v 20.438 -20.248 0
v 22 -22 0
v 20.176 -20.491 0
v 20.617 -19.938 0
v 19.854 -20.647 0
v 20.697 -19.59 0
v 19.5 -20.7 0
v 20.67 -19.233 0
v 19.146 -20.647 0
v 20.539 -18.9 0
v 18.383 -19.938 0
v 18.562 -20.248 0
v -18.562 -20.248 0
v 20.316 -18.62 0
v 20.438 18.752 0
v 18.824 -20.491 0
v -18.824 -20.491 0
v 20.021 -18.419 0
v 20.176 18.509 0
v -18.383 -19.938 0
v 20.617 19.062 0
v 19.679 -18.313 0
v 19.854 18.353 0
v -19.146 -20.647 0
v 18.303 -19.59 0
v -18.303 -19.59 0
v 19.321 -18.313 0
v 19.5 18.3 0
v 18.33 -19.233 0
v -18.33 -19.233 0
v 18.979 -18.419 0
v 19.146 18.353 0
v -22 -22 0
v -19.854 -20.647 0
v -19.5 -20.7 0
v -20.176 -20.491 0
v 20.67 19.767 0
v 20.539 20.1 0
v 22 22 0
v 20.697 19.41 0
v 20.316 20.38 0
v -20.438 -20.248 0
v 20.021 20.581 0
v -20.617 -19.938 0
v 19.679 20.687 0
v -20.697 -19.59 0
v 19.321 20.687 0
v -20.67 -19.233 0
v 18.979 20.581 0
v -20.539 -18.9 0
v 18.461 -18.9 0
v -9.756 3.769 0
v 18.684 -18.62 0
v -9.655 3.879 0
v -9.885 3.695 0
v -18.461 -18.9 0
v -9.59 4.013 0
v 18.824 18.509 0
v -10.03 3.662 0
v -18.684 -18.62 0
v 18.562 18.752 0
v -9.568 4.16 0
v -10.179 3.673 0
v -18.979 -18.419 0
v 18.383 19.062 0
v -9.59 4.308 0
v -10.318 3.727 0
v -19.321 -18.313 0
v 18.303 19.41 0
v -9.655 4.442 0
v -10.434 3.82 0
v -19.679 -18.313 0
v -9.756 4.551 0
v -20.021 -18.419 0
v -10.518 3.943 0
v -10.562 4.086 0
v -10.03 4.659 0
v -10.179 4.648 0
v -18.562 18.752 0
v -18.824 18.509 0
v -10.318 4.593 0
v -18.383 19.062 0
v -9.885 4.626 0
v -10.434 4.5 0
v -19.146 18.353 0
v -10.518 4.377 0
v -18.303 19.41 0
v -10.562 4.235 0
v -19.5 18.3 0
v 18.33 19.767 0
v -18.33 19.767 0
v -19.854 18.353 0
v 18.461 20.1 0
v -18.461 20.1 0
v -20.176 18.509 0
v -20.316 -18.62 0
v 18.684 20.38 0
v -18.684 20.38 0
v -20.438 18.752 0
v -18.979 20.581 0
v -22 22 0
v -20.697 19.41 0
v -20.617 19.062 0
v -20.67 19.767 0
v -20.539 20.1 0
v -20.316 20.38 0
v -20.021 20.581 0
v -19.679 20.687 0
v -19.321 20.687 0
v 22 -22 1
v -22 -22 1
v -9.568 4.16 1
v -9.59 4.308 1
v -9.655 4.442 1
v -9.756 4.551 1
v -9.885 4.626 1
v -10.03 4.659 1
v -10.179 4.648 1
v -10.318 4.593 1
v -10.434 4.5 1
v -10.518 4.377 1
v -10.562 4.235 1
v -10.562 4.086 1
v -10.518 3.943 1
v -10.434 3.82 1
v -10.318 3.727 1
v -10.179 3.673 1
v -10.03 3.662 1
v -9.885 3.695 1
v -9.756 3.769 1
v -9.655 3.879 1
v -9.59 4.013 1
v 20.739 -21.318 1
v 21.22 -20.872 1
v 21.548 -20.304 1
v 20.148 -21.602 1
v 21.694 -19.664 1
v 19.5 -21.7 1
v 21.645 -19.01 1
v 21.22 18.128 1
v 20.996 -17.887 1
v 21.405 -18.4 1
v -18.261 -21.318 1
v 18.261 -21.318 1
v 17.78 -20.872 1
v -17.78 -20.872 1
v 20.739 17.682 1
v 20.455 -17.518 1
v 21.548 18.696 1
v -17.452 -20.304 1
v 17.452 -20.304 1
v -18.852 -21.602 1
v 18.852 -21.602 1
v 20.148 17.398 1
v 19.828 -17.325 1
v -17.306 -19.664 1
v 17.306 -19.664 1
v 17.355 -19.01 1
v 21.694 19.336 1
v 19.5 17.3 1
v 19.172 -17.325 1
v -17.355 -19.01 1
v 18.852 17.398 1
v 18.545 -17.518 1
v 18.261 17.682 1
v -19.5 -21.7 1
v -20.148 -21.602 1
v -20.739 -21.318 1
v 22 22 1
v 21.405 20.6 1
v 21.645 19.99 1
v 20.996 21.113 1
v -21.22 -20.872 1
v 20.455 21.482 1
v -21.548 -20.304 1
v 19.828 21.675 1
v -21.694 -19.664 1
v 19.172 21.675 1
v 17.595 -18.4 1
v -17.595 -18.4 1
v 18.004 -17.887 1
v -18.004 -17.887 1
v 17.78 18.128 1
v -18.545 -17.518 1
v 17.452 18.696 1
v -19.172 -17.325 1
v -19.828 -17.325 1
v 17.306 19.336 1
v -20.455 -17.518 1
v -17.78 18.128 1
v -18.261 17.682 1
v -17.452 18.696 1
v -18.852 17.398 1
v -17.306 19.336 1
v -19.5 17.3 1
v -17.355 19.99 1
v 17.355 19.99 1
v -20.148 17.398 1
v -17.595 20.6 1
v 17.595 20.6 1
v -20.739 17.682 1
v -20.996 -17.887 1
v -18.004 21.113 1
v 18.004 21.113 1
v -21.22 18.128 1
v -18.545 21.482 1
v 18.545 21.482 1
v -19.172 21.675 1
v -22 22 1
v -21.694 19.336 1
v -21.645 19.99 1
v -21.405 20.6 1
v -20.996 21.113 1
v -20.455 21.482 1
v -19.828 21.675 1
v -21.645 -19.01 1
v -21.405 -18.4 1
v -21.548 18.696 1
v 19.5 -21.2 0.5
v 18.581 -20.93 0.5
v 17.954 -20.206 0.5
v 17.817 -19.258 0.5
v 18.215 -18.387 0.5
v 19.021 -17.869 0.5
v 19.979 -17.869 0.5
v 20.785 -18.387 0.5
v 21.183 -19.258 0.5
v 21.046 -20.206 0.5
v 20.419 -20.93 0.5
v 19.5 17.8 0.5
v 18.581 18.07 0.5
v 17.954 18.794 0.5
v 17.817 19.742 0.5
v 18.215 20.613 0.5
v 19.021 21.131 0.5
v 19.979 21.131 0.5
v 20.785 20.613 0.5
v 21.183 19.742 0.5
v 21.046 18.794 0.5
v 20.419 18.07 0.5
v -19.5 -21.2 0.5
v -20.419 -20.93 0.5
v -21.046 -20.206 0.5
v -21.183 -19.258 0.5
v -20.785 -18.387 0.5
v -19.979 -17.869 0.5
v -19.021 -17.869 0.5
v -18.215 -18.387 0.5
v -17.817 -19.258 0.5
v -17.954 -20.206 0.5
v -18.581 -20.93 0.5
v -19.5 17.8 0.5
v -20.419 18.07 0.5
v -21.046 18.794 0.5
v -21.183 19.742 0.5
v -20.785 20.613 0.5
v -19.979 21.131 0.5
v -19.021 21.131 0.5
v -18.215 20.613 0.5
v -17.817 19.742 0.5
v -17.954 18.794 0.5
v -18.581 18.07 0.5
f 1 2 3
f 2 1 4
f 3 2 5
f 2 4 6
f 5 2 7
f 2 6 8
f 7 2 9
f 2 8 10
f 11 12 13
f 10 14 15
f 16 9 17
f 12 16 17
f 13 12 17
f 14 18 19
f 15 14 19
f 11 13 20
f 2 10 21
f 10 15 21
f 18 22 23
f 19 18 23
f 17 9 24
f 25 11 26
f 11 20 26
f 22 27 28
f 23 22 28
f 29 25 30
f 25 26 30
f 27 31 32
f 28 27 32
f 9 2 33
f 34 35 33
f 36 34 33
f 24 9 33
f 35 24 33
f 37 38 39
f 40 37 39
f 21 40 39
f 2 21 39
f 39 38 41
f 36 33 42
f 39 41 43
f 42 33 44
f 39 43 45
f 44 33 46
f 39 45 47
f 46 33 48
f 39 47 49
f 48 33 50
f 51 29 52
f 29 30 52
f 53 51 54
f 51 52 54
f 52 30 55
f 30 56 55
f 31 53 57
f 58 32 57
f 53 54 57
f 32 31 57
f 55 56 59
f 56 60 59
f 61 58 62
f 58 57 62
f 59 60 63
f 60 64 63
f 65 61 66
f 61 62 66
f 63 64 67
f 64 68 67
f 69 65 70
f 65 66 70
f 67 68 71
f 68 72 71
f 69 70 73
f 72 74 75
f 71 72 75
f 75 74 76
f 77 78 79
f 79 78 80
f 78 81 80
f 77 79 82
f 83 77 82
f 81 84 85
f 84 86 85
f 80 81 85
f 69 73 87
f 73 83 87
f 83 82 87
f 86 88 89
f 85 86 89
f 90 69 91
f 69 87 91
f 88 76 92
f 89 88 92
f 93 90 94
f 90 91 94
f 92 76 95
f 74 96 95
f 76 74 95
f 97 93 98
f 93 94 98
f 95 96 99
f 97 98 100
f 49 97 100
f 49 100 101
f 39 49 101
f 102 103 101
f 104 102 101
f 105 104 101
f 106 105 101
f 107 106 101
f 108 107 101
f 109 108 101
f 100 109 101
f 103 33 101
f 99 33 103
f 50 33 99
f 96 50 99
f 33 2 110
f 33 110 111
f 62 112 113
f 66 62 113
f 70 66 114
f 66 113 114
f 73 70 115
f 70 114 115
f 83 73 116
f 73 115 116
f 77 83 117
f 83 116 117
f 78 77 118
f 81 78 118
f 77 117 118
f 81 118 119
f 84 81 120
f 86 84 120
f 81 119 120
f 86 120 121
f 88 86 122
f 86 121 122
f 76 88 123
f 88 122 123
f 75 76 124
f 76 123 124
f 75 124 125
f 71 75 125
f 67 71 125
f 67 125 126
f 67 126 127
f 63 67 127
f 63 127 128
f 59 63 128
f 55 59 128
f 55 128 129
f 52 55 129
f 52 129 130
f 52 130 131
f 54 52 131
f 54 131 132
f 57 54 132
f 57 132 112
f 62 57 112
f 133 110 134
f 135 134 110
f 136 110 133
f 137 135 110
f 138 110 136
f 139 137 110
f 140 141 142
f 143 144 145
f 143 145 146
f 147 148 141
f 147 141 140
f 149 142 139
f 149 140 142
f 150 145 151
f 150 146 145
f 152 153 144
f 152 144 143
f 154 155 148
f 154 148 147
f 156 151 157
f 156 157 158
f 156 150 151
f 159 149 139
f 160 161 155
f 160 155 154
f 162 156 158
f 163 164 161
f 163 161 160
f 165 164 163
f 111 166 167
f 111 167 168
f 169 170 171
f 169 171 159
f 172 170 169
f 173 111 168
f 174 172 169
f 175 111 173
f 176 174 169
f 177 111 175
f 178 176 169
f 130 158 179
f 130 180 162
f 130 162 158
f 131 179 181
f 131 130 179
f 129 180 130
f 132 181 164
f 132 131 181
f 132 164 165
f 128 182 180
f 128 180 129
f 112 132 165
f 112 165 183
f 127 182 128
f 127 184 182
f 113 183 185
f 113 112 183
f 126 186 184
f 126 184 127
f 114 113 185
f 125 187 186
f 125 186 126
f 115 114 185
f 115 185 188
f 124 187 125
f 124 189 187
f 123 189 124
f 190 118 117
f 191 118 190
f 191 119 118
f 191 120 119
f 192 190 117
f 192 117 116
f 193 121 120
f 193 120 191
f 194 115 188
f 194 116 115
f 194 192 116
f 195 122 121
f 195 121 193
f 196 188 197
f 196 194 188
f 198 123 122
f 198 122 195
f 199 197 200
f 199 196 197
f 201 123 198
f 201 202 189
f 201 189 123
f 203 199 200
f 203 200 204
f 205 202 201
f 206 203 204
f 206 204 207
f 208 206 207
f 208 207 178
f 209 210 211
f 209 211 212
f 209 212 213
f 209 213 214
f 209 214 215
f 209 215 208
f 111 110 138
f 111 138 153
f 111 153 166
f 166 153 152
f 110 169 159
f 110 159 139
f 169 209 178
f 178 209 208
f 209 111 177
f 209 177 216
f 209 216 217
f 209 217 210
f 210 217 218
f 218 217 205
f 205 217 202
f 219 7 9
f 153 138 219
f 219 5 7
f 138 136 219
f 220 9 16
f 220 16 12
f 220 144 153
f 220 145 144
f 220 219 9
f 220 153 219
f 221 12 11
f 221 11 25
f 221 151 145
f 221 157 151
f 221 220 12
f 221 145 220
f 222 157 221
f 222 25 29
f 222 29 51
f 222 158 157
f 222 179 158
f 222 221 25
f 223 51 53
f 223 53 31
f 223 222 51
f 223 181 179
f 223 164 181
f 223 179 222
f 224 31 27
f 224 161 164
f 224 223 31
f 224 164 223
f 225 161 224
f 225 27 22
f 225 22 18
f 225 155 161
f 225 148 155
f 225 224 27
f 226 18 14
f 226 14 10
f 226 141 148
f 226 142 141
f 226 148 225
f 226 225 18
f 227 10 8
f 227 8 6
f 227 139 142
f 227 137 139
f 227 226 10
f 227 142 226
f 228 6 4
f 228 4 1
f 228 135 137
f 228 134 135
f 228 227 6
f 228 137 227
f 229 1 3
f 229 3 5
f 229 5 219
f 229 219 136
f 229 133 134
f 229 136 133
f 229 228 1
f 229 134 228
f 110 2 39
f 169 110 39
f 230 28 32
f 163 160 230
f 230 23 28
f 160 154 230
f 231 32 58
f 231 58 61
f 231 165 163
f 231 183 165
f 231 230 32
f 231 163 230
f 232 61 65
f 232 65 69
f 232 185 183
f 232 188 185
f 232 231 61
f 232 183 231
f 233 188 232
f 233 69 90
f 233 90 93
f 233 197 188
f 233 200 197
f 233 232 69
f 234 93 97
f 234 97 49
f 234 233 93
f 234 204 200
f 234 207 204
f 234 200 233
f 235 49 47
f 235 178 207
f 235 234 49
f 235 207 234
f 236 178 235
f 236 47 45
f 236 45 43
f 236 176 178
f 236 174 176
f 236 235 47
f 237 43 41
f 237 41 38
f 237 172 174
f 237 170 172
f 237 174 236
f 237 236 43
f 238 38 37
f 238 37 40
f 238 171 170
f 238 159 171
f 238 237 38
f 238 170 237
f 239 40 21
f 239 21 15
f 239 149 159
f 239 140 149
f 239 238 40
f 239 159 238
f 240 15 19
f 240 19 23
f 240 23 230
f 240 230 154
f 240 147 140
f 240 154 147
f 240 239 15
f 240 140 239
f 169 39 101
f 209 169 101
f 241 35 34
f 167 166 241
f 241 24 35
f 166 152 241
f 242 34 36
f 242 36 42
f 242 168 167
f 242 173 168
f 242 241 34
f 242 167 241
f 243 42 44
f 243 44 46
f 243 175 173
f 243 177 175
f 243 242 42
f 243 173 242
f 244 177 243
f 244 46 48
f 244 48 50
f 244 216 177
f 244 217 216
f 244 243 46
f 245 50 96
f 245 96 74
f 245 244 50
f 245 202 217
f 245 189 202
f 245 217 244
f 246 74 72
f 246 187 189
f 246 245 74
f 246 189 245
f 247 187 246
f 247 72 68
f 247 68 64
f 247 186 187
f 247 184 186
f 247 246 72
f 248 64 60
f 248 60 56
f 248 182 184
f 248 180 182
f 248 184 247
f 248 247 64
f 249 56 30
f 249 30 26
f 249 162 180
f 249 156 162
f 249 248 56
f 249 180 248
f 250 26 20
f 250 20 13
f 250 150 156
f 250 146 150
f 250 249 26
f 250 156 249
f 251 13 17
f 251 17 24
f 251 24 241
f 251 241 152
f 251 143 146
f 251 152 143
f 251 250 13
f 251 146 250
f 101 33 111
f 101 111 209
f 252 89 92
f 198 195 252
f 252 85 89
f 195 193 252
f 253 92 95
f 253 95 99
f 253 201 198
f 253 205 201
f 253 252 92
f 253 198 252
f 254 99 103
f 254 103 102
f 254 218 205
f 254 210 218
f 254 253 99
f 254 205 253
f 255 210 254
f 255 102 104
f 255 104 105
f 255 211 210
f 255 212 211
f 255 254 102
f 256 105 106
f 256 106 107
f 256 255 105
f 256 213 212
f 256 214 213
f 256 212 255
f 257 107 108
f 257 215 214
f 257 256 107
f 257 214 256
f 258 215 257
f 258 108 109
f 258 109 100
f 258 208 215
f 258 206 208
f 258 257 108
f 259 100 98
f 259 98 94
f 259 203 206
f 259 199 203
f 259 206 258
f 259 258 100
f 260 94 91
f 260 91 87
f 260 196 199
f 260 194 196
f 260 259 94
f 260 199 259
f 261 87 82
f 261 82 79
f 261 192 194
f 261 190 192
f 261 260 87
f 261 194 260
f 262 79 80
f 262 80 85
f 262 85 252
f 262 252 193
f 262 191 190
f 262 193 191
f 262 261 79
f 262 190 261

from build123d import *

# Parameters (mm, degrees)
ESQUISSE3_W                                 = 44
ESQUISSE3_H                                 = 44
BOSS_EXTRU_1_DEPTH                          = 1
SKETCH_HOLES_R                              = 0.5
CUT_EXTRUDE_HOLES_DEPTH                     = 2
FRAISAGE_POUR_VIS_T_TE_FRAIS_E_M21_AT_COUNT = 2
FRAISAGE_POUR_VIS_T_TE_FRAIS_E_M21_AT_PITCH = 39
FRAISAGE_POUR_VIS_T_TE_FRAIS_E_M21_2_COUNT  = 2
FRAISAGE_POUR_VIS_T_TE_FRAIS_E_M21_2_PITCH  = 55.154328933
FRAISAGE_POUR_VIS_T_TE_FRAIS_E_M21_3_COUNT  = 2
FRAISAGE_POUR_VIS_T_TE_FRAIS_E_M21_3_PITCH  = 39


with BuildPart() as part:
    # Esquisse3 → Boss.-Extru.1 (new body)
    with BuildSketch(Plane(origin=(0, 0, 0), x_dir=(0, 1, 0), z_dir=(0, 0, 1))):
        Rectangle(ESQUISSE3_W, ESQUISSE3_H)
    extrude(amount=BOSS_EXTRU_1_DEPTH)

    # Sketch_Holes → Cut_Extrude_Holes (cut, through all)
    with BuildSketch(Plane.XY.offset(1)):
        with Locations((-10.067654011, 4.160184375)):
            Circle(SKETCH_HOLES_R)
    extrude(amount=-CUT_EXTRUDE_HOLES_DEPTH, mode=Mode.SUBTRACT)

    # Esquisse5 → Fraisage pour vis à tête fraisée M21 (revolve, cut)
    with BuildSketch(Plane(origin=(19.5, -19.5, 1), x_dir=(0, -1, 0), z_dir=(1, 0, 0))):
        Polygon((0, 0), (0, 2), (1.2, 2), (1.2, 1), (2.2, 0), align=None)
    fraisage_pour_vis_t_te_frais_e_m21 = revolve(axis=Axis((19.5, -19.5, 7.35), (0, 0, -1)), mode=Mode.SUBTRACT)

    # Fraisage pour vis à tête fraisée M21 at: Fraisage pour vis à tête fraisée M21 ×2
    with Locations(*[(-i * FRAISAGE_POUR_VIS_T_TE_FRAIS_E_M21_AT_PITCH, 0, 0) for i in range(1, FRAISAGE_POUR_VIS_T_TE_FRAIS_E_M21_AT_COUNT)]):
        add(fraisage_pour_vis_t_te_frais_e_m21, mode=Mode.SUBTRACT)

    # Fraisage pour vis _ t_te frais_e M21 2: Fraisage pour vis à tête fraisée M21 ×2
    with Locations(*[Vector(-0.707106781, 0.707106781, 0) * (i * FRAISAGE_POUR_VIS_T_TE_FRAIS_E_M21_2_PITCH) for i in range(1, FRAISAGE_POUR_VIS_T_TE_FRAIS_E_M21_2_COUNT)]):
        add(fraisage_pour_vis_t_te_frais_e_m21, mode=Mode.SUBTRACT)

    # Fraisage pour vis _ t_te frais_e M21 3: Fraisage pour vis à tête fraisée M21 ×2
    with Locations(*[(0, i * FRAISAGE_POUR_VIS_T_TE_FRAIS_E_M21_3_PITCH, 0) for i in range(1, FRAISAGE_POUR_VIS_T_TE_FRAIS_E_M21_3_COUNT)]):
        add(fraisage_pour_vis_t_te_frais_e_m21, mode=Mode.SUBTRACT)


solid = part.part
